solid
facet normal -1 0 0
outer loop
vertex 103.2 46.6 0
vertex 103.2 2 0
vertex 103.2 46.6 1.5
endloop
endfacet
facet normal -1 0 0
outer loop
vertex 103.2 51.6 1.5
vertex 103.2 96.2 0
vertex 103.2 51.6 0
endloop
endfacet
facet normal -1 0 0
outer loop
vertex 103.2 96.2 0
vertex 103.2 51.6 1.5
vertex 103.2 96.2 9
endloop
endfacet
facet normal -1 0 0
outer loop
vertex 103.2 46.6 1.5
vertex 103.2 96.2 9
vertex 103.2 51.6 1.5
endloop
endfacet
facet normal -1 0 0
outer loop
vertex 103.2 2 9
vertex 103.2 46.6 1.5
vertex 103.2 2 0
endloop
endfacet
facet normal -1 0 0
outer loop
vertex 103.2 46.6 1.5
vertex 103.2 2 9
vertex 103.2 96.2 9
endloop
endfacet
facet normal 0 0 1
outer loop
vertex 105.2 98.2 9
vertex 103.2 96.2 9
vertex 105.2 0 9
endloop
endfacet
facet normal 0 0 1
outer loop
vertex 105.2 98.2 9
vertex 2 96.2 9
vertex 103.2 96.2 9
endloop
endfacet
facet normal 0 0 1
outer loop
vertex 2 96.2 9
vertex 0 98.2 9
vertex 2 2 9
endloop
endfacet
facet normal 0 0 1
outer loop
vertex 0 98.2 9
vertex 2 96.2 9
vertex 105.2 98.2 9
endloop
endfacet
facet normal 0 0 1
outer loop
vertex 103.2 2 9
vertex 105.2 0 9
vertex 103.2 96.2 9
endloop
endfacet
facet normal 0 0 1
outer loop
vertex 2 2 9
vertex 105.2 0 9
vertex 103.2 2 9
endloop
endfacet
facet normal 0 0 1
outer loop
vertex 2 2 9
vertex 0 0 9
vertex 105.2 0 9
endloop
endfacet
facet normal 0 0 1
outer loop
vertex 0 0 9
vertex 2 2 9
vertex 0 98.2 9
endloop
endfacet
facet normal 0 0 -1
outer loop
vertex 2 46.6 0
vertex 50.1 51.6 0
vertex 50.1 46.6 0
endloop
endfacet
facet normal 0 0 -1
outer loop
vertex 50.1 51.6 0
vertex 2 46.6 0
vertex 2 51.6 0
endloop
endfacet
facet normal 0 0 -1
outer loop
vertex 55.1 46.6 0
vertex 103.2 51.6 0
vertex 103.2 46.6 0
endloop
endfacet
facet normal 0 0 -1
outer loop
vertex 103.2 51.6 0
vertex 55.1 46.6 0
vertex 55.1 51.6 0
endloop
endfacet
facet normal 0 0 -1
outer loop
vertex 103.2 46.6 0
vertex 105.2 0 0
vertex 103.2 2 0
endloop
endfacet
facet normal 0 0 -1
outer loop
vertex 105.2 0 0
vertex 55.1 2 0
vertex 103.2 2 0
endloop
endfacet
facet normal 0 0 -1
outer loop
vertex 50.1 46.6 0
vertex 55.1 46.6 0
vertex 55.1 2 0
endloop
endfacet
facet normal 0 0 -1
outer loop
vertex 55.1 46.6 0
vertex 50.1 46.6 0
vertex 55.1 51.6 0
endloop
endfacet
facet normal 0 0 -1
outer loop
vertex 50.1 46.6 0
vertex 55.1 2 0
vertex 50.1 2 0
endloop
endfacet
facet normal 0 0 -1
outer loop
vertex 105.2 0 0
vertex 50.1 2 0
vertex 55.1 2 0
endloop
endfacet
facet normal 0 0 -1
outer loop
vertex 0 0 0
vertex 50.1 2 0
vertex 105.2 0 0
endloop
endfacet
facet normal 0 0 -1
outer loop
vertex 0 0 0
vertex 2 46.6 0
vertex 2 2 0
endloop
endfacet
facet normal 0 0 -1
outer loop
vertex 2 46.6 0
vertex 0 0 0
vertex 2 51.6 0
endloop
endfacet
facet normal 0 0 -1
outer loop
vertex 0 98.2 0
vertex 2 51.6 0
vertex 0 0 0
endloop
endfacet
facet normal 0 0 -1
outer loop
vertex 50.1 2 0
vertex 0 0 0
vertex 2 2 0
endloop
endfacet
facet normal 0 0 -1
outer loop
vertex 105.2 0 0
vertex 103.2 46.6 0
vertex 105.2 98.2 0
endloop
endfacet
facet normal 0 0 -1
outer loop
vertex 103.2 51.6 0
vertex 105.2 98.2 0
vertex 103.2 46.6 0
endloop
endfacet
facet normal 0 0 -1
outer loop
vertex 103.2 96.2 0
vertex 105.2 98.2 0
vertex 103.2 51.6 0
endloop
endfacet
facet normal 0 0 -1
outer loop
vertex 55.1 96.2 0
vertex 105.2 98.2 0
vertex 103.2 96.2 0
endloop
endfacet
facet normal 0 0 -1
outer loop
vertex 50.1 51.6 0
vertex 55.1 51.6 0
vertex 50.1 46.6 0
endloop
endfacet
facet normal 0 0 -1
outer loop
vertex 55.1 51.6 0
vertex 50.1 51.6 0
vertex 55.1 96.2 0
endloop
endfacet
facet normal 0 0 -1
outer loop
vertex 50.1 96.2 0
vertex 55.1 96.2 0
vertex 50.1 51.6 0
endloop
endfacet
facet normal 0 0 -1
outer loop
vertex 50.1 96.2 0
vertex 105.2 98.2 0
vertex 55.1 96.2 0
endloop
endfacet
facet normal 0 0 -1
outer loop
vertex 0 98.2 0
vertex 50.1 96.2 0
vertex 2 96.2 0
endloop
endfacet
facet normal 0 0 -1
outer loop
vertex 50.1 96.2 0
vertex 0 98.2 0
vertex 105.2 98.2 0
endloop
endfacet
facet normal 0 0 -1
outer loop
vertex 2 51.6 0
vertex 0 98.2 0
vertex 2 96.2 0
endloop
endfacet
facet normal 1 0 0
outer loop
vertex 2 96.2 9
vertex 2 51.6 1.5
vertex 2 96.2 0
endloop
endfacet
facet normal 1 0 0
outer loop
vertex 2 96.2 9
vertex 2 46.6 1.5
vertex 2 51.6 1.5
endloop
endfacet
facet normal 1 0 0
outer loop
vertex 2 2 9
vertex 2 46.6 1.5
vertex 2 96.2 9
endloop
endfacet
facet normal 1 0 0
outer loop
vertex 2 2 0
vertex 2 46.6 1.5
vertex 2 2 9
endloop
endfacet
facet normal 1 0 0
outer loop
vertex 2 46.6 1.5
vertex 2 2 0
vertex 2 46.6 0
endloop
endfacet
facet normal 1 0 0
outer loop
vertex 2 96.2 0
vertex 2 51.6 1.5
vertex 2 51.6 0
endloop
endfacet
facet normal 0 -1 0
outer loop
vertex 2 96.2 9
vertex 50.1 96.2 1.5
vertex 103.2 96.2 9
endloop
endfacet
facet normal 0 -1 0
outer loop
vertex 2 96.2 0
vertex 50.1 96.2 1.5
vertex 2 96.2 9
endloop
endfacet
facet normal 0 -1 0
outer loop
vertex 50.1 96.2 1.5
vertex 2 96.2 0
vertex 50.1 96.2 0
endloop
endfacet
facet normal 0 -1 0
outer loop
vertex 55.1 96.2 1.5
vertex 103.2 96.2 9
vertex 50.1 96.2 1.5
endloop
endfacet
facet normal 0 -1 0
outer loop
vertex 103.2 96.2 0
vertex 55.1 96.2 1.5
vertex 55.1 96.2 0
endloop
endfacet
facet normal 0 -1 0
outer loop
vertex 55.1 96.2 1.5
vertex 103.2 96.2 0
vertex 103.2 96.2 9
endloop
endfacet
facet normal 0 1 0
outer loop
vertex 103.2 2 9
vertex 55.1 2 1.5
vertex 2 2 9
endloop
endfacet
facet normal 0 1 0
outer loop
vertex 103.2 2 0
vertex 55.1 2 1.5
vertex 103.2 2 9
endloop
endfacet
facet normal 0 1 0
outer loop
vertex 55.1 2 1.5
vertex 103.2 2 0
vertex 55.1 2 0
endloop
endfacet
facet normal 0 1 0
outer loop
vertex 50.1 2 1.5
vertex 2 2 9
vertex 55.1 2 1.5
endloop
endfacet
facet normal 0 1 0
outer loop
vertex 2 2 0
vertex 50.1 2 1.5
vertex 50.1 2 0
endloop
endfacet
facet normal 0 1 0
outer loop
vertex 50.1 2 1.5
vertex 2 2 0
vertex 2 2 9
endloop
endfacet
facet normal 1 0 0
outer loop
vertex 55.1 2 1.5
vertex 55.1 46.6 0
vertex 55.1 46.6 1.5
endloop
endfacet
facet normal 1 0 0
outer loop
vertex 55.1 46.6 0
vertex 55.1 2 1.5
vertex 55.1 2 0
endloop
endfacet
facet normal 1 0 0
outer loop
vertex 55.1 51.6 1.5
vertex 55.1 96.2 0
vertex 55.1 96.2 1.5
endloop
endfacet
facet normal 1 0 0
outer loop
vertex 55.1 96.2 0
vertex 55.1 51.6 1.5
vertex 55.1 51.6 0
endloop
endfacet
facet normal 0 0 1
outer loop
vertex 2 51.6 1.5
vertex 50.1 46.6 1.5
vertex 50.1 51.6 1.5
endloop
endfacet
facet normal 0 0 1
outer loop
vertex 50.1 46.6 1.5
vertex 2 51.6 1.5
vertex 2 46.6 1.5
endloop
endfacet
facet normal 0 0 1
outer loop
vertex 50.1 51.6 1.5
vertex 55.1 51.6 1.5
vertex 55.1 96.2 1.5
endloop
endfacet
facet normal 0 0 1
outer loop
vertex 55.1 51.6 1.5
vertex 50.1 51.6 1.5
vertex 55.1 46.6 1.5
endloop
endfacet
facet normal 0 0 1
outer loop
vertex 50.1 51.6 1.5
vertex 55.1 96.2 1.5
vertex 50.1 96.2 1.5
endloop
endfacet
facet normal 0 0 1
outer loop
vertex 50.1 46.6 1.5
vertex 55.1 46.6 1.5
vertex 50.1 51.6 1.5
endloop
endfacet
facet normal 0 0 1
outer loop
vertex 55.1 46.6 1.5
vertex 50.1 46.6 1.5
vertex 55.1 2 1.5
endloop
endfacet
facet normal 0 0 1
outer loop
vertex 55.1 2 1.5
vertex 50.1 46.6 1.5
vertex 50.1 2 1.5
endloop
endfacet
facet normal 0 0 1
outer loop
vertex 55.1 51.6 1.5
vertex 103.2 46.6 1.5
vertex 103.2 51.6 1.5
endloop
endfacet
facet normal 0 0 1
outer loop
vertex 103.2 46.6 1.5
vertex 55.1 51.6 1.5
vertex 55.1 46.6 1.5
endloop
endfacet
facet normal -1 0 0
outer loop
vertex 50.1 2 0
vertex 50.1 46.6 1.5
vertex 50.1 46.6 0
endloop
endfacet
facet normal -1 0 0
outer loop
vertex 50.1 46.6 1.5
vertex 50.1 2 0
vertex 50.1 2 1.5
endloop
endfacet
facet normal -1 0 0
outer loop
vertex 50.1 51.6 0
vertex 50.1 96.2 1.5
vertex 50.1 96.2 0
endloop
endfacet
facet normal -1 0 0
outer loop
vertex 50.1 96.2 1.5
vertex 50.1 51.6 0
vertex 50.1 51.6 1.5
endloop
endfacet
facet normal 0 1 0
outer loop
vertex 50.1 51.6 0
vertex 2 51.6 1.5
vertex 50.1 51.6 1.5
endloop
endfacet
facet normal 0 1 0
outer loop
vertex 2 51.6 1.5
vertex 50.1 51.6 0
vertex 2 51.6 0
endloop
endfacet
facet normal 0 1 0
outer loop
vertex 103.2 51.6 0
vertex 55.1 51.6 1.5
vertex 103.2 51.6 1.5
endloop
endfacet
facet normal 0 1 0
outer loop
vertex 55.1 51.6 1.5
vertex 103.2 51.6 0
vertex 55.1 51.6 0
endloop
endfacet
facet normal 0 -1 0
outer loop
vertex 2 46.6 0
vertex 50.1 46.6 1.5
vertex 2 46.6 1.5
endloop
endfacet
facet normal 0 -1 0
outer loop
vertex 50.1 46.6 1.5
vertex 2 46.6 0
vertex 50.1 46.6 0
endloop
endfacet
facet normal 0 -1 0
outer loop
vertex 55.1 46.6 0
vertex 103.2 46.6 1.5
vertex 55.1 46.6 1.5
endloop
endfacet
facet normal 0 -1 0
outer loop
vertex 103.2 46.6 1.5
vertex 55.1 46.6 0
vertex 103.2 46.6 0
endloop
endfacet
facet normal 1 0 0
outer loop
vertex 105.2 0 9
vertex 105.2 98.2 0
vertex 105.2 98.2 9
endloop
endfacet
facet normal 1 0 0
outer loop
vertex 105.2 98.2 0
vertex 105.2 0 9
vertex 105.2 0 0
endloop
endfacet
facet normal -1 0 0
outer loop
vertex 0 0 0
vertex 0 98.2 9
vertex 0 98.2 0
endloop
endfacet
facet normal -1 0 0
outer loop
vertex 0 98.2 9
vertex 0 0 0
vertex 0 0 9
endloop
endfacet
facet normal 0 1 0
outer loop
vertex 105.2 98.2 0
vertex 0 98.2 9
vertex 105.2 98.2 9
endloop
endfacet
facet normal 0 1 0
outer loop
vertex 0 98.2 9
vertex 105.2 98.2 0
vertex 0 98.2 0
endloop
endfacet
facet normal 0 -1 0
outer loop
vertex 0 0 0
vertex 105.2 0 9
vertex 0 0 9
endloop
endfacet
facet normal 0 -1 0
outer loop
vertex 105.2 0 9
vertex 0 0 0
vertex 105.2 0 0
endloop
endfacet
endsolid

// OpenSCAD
WIDTH = 105.2;
LENGTH = 98.2;
HEIGHT = 9;
THICKNESS = 2;

BAR_WIDTH = 5;
BAR_HEIGHT = 1.5;

difference() {
    t2 = 2 * THICKNESS;
    cube(size = [WIDTH, LENGTH, HEIGHT]);
    translate([THICKNESS, THICKNESS, 0])
    difference() {
        cube(size = [WIDTH - t2, LENGTH - t2, HEIGHT]);
        translate([WIDTH/2 - BAR_WIDTH/2 - THICKNESS, 0, 0])
        cube(size = [BAR_WIDTH, LENGTH, BAR_HEIGHT]);

        translate([0, LENGTH/2 - BAR_WIDTH/2 - THICKNESS, 0])
        cube(size = [WIDTH, BAR_WIDTH, BAR_HEIGHT]);
    }
}
